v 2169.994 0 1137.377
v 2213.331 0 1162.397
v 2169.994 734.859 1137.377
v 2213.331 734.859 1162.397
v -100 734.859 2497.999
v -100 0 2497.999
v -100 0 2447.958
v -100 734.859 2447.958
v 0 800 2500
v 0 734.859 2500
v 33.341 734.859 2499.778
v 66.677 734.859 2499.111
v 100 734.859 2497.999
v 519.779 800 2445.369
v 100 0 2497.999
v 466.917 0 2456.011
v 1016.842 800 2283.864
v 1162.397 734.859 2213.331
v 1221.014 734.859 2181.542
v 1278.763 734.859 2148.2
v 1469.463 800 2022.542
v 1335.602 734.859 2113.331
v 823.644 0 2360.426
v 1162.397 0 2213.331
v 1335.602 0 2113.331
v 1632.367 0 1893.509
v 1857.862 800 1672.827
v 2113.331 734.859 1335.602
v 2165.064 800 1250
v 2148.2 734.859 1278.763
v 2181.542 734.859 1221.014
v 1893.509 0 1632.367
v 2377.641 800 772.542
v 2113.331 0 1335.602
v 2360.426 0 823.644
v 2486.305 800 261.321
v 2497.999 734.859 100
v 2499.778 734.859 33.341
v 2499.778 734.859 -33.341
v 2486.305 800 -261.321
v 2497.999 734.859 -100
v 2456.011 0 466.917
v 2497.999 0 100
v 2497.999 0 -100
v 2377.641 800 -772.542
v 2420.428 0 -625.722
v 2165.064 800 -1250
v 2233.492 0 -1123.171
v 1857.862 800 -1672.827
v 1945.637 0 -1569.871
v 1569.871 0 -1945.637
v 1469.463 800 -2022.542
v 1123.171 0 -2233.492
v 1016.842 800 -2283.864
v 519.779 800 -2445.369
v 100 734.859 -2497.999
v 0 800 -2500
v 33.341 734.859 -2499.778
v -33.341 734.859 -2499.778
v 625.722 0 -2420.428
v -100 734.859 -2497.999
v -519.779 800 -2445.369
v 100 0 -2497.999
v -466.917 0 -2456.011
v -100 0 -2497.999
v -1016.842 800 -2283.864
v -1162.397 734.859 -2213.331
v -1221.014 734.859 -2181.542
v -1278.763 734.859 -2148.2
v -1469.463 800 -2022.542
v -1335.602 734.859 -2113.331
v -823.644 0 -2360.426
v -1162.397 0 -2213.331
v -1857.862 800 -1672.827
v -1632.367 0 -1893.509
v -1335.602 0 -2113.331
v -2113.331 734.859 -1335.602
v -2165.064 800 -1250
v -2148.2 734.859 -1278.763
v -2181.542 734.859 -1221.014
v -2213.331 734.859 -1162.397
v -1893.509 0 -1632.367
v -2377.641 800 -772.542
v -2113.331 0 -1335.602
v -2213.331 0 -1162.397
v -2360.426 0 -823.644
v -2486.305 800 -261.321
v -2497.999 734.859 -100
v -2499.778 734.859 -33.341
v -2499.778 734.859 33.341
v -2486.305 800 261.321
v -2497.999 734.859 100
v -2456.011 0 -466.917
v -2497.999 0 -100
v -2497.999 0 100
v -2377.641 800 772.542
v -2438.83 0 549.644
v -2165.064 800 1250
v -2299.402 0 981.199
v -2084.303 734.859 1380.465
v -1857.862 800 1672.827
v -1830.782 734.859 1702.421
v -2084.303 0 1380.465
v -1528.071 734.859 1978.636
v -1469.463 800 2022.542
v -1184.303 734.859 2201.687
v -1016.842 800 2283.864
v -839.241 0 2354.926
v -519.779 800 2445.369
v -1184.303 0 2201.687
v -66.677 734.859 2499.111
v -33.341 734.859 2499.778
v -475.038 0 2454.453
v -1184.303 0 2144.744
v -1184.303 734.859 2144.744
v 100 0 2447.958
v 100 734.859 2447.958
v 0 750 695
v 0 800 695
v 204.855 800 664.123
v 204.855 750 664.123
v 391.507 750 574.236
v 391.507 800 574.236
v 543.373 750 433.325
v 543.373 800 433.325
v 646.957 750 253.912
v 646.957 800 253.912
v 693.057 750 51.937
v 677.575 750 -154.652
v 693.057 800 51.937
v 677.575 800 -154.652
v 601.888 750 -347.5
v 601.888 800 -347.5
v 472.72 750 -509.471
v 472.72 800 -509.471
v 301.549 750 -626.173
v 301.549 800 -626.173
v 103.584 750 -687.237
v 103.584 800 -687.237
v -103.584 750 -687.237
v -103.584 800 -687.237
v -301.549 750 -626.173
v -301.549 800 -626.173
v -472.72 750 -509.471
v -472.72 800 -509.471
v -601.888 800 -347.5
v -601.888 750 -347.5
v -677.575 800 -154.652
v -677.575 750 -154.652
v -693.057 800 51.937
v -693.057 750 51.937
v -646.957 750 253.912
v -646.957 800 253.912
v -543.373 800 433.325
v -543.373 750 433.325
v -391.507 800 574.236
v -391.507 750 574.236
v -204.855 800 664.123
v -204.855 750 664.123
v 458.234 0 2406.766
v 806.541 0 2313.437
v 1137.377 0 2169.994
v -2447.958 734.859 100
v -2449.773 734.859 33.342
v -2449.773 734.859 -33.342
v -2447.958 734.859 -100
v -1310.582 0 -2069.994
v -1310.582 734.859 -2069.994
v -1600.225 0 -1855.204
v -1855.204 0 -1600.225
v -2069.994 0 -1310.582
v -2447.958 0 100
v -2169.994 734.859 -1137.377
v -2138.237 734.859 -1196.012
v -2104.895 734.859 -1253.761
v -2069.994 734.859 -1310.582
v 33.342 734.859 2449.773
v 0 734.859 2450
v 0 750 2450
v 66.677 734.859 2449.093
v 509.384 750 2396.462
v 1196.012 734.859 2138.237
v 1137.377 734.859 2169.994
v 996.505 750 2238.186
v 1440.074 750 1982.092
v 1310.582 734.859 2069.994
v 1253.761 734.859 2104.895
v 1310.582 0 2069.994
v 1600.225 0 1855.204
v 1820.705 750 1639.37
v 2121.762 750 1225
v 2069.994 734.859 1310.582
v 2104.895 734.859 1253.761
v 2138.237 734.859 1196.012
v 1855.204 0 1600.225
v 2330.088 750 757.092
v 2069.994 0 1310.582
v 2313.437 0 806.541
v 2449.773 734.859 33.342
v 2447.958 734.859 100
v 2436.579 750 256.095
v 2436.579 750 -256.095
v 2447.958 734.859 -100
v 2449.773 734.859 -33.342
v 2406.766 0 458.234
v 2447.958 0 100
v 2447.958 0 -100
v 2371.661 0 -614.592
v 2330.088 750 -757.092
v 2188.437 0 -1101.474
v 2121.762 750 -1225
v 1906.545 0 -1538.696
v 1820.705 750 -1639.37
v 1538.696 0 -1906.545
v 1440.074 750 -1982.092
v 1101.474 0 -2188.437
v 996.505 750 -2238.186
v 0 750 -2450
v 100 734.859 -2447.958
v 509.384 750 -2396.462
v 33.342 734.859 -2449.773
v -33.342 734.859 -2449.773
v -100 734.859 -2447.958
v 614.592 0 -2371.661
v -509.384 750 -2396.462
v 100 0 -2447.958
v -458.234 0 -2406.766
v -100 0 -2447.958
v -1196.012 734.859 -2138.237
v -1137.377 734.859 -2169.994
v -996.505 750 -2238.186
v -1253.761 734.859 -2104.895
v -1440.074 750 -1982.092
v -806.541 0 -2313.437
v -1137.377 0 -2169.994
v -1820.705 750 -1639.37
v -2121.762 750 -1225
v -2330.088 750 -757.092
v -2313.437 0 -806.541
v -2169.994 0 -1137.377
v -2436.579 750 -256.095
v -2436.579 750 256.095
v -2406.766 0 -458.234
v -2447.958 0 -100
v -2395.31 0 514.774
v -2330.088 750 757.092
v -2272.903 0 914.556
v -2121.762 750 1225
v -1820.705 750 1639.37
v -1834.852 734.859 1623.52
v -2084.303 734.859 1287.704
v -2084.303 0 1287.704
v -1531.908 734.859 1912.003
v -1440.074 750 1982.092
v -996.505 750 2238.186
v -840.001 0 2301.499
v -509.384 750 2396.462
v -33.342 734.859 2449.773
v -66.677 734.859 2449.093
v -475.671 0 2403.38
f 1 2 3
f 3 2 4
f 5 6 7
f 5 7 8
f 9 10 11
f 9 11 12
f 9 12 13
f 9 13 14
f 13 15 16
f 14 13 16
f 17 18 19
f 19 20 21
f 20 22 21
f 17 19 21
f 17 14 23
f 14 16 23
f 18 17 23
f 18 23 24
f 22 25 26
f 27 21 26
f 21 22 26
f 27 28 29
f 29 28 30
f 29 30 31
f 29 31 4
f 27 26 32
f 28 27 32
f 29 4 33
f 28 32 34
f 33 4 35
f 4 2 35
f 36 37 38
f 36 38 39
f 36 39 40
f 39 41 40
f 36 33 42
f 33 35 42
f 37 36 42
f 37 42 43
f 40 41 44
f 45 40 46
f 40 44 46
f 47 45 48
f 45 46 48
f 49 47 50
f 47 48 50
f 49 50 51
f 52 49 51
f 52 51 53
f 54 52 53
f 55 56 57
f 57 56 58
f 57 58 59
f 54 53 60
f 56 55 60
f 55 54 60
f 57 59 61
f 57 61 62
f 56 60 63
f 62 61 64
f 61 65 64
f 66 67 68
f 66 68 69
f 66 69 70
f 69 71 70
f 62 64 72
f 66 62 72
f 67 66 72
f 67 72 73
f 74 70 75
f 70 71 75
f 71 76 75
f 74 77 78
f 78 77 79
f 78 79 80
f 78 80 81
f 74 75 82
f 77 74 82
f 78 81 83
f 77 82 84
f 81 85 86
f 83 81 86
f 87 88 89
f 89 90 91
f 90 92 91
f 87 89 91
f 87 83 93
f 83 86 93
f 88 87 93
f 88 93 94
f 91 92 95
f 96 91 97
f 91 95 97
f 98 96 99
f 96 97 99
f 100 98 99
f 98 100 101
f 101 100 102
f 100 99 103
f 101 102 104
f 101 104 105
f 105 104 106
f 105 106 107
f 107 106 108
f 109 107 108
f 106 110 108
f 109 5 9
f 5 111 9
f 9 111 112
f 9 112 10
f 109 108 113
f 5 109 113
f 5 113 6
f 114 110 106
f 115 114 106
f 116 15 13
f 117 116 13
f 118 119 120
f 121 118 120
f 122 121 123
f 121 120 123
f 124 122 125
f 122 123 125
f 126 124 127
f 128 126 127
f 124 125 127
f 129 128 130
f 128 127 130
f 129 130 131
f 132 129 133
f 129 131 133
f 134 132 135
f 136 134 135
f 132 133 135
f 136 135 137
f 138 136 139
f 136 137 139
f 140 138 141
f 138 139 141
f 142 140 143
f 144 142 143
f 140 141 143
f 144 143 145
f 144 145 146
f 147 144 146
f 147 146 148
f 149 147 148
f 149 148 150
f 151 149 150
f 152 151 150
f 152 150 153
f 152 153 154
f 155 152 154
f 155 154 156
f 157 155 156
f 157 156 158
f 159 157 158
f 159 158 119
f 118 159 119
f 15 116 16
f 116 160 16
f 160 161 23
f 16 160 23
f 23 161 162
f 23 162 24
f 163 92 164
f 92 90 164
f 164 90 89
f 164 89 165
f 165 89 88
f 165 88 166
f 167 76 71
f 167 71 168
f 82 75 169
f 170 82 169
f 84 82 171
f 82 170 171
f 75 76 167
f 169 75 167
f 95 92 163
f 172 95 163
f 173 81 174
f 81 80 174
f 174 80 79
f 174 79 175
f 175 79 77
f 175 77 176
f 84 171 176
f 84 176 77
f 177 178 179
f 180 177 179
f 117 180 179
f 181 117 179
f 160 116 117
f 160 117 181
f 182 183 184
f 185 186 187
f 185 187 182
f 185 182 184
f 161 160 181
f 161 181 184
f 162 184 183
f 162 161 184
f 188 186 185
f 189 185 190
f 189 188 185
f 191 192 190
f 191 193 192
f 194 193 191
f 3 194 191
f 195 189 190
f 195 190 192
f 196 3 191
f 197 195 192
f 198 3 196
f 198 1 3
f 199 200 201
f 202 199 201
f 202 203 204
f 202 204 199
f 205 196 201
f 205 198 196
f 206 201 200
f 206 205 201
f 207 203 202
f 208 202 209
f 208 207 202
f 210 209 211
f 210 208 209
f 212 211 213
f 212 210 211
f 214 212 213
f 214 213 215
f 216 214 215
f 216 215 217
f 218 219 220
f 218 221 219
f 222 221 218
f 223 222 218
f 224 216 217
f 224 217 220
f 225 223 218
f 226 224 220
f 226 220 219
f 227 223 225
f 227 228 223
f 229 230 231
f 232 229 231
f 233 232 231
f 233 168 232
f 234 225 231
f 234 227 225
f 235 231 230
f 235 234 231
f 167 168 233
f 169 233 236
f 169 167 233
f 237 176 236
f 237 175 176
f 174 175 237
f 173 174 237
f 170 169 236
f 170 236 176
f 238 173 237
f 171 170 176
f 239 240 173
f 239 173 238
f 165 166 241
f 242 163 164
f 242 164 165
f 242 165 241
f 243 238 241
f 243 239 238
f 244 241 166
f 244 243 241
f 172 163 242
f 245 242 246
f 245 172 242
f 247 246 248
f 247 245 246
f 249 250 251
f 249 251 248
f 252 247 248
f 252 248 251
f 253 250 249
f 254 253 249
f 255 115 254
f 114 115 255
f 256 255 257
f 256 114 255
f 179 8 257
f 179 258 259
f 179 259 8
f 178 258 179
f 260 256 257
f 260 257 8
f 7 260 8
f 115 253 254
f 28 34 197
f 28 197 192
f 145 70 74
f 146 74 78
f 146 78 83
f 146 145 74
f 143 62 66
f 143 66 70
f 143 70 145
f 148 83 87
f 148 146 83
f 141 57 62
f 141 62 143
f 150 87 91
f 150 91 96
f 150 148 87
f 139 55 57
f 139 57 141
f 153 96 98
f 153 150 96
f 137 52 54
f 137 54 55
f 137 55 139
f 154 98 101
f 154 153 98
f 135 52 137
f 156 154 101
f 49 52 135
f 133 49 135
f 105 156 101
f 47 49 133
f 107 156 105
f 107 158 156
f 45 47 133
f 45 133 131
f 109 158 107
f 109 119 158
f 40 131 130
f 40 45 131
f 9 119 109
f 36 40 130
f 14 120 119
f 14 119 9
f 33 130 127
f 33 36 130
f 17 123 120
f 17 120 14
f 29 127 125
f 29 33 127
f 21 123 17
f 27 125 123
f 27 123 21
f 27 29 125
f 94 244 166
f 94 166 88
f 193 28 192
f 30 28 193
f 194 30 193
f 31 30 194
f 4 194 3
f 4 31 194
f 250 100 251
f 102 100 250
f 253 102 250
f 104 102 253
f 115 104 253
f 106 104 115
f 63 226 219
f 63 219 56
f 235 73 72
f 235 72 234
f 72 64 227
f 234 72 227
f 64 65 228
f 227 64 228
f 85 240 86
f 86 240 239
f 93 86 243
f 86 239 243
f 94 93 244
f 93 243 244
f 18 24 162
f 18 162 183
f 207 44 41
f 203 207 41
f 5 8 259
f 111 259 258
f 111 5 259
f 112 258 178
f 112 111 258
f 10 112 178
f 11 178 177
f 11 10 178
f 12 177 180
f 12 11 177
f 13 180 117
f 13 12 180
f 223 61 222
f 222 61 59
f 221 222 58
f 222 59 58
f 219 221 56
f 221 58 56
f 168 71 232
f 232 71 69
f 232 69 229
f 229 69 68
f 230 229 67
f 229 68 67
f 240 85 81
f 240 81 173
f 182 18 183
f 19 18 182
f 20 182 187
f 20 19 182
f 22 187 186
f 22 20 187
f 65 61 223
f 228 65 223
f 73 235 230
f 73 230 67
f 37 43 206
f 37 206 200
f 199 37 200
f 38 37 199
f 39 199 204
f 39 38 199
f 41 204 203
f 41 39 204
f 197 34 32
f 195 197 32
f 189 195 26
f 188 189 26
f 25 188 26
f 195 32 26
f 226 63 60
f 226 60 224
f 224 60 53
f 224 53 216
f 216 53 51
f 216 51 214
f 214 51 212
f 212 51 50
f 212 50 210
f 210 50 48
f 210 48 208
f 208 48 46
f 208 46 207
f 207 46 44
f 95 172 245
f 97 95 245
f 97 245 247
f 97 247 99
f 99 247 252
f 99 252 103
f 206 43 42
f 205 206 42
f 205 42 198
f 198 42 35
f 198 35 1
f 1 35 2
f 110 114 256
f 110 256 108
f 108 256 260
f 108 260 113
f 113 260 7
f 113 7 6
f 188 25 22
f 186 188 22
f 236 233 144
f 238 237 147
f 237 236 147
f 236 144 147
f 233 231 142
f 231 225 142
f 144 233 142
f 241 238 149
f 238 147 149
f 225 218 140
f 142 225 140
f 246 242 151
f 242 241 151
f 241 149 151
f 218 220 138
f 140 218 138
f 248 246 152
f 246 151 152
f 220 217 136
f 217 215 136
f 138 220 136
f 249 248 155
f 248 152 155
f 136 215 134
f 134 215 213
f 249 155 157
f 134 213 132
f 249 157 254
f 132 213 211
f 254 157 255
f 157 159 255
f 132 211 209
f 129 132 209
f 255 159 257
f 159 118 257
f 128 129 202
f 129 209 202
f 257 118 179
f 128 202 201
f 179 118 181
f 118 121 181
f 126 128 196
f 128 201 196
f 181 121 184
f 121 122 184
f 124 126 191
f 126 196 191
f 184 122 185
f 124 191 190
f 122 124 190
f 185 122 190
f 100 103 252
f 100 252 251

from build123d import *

# Parameters (mm, degrees)
SKETCH2_R           = 2500
BOSS_EXTRUDE1_DEPTH = 800
SHELL1_T            = -50
SKETCH3_R           = 695
CUT_EXTRUDE1_DEPTH  = 800
SKETCH9_W           = 200
SKETCH9_H           = 1469.718314702
CUT_EXTRUDE3_DEPTH  = 800
CIRPATTERN1_COUNT   = 4
CIRPATTERN1_ANGLE   = 90
CIRPATTERN2_DEPTH   = 734.859157351
SKETCH10_W          = 900
SKETCH10_H          = 1148.258495741
CUT_EXTRUDE4_DEPTH  = 1738


# Read off the part's stored shape, not the designer's step: CirPattern2
with BuildPart() as part:
    # Sketch2 → Boss-Extrude1 (new body)
    with BuildSketch(Plane(origin=(0, 0, 0), x_dir=(1, 0, 0), z_dir=(0, 1, 0))):
        with Locations(Location((0, 0, 0), (0, 0, 270))):
            Circle(SKETCH2_R)
    extrude(amount=BOSS_EXTRUDE1_DEPTH)

    # Shell1
    shell1_openings = [part.faces().sort_by_distance(p)[0] for p in [
        (0, 0, 0),
    ]]
    offset(amount=SHELL1_T, openings=shell1_openings, kind=Kind.INTERSECTION)

    # Sketch3 → Cut-Extrude1 (cut)
    with BuildSketch(Plane(origin=(0, 800, 0), x_dir=(1, 0, 0), z_dir=(0, 1, 0))):
        with Locations(Location((0, 0, 0), (0, 0, 270))):
            Circle(SKETCH3_R)
    extrude(amount=-CUT_EXTRUDE1_DEPTH, mode=Mode.SUBTRACT)

    # Sketch9 → Cut-Extrude3 (cut)
    with BuildSketch(Plane.XY.offset(2500)):
        Rectangle(SKETCH9_W, SKETCH9_H)
    cut_extrude3 = extrude(amount=-CUT_EXTRUDE3_DEPTH, mode=Mode.SUBTRACT)

    # CirPattern1: Cut-Extrude3 ×4 about axis
    cirpattern1_axis = Axis((0, 0, 0), (0, 1, 0))
    for i in range(1, CIRPATTERN1_COUNT):
        add(cut_extrude3.rotate(cirpattern1_axis, i * CIRPATTERN1_ANGLE / (CIRPATTERN1_COUNT - 1)), mode=Mode.SUBTRACT)

    # CirPattern2 outline → CirPattern2 (cut)
    with BuildSketch(Plane(origin=(0, 0, 0), x_dir=(1, 0, 0), z_dir=(0, 1, 0))):
        with BuildLine():
            ThreePointArc((-100, 2447.958332979), (0, 2450), (100, 2447.958332979))
            Line((100, 2447.958332979), (100, 2497.999199359))
            ThreePointArc((100, 2497.999199359), (0, 2500), (-100, 2497.999199359))
            Line((-100, 2497.999199359), (-100, 2447.958332979))
        make_face()
        with BuildLine():
            Line((-2497.999199359, -100), (-2447.958332979, -100))
            ThreePointArc((-2447.958332979, -100), (-2450, 0), (-2447.958332979, 100))
            Line((-2447.958332979, 100), (-2497.999199359, 100))
            ThreePointArc((-2497.999199359, 100), (-2500, 0), (-2497.999199359, -100))
        make_face()
        with BuildLine():
            ThreePointArc((-1310.581706868, 2069.994103765), (-1225, 2121.762239272), (-1137.376626111, 2169.994103765))
            Line((-1137.376626111, 2169.994103765), (-1162.397059301, 2213.330765278))
            ThreePointArc((-1162.397059301, 2213.330765278), (-1250, 2165.063509461), (-1335.602140058, 2113.330765278))
            Line((-1335.602140058, 2113.330765278), (-1310.581706868, 2069.994103765))
        make_face()
        with BuildLine():
            Line((-2213.330765278, 1162.397059301), (-2169.994103765, 1137.376626111))
            ThreePointArc((-2169.994103765, 1137.376626111), (-2121.762239272, 1225), (-2069.994103765, 1310.581706868))
            Line((-2069.994103765, 1310.581706868), (-2113.330765278, 1335.602140058))
            ThreePointArc((-2113.330765278, 1335.602140058), (-2165.063509461, 1250), (-2213.330765278, 1162.397059301))
        make_face()
    extrude(amount=CIRPATTERN2_DEPTH, mode=Mode.SUBTRACT)

    # Sketch10 → Cut-Extrude4 (cut)
    with BuildSketch(Plane.XY.offset(2500)):
        with Locations((-1634.302676631, 160.72990948)):
            Rectangle(SKETCH10_W, SKETCH10_H)
    extrude(amount=-CUT_EXTRUDE4_DEPTH, mode=Mode.SUBTRACT)


solid = part.part
